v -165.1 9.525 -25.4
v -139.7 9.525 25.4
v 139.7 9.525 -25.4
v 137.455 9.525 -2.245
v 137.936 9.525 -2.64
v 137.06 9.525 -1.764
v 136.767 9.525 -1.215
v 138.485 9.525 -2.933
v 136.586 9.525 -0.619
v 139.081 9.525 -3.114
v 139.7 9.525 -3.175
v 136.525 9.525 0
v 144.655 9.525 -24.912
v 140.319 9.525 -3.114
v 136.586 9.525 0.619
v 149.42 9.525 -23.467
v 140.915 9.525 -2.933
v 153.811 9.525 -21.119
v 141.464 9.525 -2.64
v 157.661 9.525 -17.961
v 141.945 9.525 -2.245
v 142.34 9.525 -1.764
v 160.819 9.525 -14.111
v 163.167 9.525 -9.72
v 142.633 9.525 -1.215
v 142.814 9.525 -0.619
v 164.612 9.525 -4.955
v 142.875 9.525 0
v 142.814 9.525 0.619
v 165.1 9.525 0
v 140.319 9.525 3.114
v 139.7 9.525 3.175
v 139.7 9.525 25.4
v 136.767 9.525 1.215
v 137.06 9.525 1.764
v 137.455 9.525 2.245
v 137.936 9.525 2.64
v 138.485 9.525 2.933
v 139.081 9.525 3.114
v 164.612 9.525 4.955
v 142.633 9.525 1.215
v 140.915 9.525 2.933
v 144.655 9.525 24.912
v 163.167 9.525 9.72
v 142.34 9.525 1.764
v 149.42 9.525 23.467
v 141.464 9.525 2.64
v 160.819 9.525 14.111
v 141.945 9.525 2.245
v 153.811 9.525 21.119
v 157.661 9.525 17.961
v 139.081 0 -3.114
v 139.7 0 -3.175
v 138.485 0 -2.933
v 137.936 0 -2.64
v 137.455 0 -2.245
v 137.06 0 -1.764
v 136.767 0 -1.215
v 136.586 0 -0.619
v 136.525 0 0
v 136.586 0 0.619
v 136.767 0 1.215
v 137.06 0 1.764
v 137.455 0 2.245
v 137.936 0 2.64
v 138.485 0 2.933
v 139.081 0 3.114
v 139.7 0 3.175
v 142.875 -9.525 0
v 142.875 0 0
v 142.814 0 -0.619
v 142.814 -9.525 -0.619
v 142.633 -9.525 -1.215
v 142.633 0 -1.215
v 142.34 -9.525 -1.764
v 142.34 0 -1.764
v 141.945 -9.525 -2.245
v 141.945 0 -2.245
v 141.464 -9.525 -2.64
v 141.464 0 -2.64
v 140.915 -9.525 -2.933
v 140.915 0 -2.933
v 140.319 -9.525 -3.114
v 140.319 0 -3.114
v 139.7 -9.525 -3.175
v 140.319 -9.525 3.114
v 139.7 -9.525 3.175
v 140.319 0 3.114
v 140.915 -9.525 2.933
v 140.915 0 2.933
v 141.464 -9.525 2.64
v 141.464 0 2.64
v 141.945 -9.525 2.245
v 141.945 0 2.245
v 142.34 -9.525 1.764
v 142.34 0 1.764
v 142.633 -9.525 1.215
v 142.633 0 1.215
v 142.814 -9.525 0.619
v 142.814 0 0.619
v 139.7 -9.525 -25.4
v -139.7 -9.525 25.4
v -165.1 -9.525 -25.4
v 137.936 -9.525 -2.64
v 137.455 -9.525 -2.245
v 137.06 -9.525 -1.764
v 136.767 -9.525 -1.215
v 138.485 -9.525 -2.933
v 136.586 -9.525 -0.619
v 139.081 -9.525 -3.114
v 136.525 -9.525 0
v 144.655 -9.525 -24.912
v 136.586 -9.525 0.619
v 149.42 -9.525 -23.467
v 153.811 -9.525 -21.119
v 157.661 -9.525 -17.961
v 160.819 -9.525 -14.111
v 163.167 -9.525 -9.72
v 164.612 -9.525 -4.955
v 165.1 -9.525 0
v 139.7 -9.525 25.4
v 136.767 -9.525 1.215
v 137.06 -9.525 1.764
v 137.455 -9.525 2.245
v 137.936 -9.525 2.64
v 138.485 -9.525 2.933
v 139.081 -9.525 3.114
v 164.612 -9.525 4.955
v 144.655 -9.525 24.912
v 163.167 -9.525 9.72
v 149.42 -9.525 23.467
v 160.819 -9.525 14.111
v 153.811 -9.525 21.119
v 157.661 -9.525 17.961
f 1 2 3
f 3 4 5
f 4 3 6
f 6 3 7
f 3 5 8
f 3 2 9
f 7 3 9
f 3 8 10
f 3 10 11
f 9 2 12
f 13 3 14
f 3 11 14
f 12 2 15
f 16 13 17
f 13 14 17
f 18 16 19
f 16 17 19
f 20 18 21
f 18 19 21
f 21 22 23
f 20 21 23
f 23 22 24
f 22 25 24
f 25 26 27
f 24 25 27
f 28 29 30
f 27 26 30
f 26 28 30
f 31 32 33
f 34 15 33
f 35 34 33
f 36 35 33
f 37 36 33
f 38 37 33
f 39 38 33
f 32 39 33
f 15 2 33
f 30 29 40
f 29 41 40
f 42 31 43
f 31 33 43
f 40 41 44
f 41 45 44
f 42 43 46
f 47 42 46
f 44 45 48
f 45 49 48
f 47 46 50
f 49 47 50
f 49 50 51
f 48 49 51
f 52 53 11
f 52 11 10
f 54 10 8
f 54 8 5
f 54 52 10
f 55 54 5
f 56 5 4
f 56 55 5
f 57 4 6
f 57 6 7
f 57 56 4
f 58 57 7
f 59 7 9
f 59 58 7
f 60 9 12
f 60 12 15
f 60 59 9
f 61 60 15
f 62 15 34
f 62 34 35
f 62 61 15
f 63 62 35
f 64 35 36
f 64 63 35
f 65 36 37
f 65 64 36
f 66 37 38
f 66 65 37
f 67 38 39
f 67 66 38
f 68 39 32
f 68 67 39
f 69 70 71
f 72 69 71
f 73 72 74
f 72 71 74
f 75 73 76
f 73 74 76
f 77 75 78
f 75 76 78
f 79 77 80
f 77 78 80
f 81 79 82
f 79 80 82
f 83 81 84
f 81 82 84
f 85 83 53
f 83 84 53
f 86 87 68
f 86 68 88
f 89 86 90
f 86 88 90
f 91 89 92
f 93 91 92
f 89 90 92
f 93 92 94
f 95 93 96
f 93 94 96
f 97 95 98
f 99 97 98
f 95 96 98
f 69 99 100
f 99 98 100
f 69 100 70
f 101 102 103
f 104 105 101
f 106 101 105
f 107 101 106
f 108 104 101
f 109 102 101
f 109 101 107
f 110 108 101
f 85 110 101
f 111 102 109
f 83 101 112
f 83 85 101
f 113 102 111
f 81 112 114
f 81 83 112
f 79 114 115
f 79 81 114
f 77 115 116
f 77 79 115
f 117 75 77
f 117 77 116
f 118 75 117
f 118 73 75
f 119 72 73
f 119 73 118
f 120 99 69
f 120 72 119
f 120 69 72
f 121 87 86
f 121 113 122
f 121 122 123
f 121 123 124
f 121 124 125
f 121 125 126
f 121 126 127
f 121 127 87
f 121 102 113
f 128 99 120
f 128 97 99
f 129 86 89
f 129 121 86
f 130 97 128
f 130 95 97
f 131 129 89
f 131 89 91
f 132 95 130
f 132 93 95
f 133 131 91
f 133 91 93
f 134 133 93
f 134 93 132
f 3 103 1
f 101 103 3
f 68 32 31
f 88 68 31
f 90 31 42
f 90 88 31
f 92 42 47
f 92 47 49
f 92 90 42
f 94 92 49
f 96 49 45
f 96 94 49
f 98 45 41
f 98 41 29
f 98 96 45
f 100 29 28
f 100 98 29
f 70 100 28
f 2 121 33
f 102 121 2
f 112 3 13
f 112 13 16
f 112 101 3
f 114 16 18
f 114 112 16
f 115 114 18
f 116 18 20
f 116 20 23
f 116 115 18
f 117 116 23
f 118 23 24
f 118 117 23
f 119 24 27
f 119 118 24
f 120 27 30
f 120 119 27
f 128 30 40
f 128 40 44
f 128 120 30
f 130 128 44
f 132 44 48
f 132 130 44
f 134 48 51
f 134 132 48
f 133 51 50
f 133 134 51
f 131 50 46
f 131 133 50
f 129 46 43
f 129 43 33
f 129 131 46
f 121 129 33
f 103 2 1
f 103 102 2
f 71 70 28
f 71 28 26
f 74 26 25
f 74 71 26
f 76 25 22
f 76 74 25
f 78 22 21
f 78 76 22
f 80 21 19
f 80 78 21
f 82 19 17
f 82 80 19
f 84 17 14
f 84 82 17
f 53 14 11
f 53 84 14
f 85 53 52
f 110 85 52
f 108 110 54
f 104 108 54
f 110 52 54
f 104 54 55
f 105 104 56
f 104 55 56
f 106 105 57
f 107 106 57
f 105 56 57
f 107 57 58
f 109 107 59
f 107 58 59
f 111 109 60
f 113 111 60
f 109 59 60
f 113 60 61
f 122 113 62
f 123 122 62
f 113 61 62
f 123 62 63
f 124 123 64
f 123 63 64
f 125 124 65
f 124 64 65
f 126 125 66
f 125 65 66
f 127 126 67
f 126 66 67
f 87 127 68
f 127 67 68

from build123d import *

# Parameters (mm, degrees)
F1_DEPTH = 9.525


with BuildPart() as f1:
    # F0 (on Front) → F1 (new body, symmetric)
    with BuildSketch(Plane.XZ):
        with BuildLine():
            ThreePointArc((139.7, -25.4), (157.6605122421, -17.9605122421), (165.1, 0))
            ThreePointArc((165.1, 0), (157.6605122421, 17.9605122421), (139.7, 25.4))
            Line((139.7, 25.4), (139.7, 3.175))
            ThreePointArc((139.7, 3.175), (141.9450640303, 2.2450640303), (142.875, 0))
            ThreePointArc((142.875, 0), (141.9450640303, -2.2450640303), (139.7, -3.175))
            Line((139.7, -3.175), (139.7, -25.4))
        make_face()
        with BuildLine():
            Line((139.7, 3.175), (139.7, 25.4))
            ThreePointArc((139.7, 25.4), (114.3, 0), (139.7, -25.4))
            Line((139.7, -25.4), (139.7, -3.175))
            ThreePointArc((139.7, -3.175), (136.525, 0), (139.7, 3.175))
        make_face()
        with BuildLine():
            ThreePointArc((139.7, -25.4), (114.3, 0), (139.7, 25.4))
            Line((139.7, 25.4), (-139.7, 25.4))
            Line((-139.7, 25.4), (-139.7, -25.4))
            Line((-139.7, -25.4), (139.7, -25.4))
        make_face()
        Polygon((-139.7, -25.4), (-139.7, 25.4), (-165.1, -25.4), align=None)
    extrude(amount=F1_DEPTH, both=True)


solid = f1.part
